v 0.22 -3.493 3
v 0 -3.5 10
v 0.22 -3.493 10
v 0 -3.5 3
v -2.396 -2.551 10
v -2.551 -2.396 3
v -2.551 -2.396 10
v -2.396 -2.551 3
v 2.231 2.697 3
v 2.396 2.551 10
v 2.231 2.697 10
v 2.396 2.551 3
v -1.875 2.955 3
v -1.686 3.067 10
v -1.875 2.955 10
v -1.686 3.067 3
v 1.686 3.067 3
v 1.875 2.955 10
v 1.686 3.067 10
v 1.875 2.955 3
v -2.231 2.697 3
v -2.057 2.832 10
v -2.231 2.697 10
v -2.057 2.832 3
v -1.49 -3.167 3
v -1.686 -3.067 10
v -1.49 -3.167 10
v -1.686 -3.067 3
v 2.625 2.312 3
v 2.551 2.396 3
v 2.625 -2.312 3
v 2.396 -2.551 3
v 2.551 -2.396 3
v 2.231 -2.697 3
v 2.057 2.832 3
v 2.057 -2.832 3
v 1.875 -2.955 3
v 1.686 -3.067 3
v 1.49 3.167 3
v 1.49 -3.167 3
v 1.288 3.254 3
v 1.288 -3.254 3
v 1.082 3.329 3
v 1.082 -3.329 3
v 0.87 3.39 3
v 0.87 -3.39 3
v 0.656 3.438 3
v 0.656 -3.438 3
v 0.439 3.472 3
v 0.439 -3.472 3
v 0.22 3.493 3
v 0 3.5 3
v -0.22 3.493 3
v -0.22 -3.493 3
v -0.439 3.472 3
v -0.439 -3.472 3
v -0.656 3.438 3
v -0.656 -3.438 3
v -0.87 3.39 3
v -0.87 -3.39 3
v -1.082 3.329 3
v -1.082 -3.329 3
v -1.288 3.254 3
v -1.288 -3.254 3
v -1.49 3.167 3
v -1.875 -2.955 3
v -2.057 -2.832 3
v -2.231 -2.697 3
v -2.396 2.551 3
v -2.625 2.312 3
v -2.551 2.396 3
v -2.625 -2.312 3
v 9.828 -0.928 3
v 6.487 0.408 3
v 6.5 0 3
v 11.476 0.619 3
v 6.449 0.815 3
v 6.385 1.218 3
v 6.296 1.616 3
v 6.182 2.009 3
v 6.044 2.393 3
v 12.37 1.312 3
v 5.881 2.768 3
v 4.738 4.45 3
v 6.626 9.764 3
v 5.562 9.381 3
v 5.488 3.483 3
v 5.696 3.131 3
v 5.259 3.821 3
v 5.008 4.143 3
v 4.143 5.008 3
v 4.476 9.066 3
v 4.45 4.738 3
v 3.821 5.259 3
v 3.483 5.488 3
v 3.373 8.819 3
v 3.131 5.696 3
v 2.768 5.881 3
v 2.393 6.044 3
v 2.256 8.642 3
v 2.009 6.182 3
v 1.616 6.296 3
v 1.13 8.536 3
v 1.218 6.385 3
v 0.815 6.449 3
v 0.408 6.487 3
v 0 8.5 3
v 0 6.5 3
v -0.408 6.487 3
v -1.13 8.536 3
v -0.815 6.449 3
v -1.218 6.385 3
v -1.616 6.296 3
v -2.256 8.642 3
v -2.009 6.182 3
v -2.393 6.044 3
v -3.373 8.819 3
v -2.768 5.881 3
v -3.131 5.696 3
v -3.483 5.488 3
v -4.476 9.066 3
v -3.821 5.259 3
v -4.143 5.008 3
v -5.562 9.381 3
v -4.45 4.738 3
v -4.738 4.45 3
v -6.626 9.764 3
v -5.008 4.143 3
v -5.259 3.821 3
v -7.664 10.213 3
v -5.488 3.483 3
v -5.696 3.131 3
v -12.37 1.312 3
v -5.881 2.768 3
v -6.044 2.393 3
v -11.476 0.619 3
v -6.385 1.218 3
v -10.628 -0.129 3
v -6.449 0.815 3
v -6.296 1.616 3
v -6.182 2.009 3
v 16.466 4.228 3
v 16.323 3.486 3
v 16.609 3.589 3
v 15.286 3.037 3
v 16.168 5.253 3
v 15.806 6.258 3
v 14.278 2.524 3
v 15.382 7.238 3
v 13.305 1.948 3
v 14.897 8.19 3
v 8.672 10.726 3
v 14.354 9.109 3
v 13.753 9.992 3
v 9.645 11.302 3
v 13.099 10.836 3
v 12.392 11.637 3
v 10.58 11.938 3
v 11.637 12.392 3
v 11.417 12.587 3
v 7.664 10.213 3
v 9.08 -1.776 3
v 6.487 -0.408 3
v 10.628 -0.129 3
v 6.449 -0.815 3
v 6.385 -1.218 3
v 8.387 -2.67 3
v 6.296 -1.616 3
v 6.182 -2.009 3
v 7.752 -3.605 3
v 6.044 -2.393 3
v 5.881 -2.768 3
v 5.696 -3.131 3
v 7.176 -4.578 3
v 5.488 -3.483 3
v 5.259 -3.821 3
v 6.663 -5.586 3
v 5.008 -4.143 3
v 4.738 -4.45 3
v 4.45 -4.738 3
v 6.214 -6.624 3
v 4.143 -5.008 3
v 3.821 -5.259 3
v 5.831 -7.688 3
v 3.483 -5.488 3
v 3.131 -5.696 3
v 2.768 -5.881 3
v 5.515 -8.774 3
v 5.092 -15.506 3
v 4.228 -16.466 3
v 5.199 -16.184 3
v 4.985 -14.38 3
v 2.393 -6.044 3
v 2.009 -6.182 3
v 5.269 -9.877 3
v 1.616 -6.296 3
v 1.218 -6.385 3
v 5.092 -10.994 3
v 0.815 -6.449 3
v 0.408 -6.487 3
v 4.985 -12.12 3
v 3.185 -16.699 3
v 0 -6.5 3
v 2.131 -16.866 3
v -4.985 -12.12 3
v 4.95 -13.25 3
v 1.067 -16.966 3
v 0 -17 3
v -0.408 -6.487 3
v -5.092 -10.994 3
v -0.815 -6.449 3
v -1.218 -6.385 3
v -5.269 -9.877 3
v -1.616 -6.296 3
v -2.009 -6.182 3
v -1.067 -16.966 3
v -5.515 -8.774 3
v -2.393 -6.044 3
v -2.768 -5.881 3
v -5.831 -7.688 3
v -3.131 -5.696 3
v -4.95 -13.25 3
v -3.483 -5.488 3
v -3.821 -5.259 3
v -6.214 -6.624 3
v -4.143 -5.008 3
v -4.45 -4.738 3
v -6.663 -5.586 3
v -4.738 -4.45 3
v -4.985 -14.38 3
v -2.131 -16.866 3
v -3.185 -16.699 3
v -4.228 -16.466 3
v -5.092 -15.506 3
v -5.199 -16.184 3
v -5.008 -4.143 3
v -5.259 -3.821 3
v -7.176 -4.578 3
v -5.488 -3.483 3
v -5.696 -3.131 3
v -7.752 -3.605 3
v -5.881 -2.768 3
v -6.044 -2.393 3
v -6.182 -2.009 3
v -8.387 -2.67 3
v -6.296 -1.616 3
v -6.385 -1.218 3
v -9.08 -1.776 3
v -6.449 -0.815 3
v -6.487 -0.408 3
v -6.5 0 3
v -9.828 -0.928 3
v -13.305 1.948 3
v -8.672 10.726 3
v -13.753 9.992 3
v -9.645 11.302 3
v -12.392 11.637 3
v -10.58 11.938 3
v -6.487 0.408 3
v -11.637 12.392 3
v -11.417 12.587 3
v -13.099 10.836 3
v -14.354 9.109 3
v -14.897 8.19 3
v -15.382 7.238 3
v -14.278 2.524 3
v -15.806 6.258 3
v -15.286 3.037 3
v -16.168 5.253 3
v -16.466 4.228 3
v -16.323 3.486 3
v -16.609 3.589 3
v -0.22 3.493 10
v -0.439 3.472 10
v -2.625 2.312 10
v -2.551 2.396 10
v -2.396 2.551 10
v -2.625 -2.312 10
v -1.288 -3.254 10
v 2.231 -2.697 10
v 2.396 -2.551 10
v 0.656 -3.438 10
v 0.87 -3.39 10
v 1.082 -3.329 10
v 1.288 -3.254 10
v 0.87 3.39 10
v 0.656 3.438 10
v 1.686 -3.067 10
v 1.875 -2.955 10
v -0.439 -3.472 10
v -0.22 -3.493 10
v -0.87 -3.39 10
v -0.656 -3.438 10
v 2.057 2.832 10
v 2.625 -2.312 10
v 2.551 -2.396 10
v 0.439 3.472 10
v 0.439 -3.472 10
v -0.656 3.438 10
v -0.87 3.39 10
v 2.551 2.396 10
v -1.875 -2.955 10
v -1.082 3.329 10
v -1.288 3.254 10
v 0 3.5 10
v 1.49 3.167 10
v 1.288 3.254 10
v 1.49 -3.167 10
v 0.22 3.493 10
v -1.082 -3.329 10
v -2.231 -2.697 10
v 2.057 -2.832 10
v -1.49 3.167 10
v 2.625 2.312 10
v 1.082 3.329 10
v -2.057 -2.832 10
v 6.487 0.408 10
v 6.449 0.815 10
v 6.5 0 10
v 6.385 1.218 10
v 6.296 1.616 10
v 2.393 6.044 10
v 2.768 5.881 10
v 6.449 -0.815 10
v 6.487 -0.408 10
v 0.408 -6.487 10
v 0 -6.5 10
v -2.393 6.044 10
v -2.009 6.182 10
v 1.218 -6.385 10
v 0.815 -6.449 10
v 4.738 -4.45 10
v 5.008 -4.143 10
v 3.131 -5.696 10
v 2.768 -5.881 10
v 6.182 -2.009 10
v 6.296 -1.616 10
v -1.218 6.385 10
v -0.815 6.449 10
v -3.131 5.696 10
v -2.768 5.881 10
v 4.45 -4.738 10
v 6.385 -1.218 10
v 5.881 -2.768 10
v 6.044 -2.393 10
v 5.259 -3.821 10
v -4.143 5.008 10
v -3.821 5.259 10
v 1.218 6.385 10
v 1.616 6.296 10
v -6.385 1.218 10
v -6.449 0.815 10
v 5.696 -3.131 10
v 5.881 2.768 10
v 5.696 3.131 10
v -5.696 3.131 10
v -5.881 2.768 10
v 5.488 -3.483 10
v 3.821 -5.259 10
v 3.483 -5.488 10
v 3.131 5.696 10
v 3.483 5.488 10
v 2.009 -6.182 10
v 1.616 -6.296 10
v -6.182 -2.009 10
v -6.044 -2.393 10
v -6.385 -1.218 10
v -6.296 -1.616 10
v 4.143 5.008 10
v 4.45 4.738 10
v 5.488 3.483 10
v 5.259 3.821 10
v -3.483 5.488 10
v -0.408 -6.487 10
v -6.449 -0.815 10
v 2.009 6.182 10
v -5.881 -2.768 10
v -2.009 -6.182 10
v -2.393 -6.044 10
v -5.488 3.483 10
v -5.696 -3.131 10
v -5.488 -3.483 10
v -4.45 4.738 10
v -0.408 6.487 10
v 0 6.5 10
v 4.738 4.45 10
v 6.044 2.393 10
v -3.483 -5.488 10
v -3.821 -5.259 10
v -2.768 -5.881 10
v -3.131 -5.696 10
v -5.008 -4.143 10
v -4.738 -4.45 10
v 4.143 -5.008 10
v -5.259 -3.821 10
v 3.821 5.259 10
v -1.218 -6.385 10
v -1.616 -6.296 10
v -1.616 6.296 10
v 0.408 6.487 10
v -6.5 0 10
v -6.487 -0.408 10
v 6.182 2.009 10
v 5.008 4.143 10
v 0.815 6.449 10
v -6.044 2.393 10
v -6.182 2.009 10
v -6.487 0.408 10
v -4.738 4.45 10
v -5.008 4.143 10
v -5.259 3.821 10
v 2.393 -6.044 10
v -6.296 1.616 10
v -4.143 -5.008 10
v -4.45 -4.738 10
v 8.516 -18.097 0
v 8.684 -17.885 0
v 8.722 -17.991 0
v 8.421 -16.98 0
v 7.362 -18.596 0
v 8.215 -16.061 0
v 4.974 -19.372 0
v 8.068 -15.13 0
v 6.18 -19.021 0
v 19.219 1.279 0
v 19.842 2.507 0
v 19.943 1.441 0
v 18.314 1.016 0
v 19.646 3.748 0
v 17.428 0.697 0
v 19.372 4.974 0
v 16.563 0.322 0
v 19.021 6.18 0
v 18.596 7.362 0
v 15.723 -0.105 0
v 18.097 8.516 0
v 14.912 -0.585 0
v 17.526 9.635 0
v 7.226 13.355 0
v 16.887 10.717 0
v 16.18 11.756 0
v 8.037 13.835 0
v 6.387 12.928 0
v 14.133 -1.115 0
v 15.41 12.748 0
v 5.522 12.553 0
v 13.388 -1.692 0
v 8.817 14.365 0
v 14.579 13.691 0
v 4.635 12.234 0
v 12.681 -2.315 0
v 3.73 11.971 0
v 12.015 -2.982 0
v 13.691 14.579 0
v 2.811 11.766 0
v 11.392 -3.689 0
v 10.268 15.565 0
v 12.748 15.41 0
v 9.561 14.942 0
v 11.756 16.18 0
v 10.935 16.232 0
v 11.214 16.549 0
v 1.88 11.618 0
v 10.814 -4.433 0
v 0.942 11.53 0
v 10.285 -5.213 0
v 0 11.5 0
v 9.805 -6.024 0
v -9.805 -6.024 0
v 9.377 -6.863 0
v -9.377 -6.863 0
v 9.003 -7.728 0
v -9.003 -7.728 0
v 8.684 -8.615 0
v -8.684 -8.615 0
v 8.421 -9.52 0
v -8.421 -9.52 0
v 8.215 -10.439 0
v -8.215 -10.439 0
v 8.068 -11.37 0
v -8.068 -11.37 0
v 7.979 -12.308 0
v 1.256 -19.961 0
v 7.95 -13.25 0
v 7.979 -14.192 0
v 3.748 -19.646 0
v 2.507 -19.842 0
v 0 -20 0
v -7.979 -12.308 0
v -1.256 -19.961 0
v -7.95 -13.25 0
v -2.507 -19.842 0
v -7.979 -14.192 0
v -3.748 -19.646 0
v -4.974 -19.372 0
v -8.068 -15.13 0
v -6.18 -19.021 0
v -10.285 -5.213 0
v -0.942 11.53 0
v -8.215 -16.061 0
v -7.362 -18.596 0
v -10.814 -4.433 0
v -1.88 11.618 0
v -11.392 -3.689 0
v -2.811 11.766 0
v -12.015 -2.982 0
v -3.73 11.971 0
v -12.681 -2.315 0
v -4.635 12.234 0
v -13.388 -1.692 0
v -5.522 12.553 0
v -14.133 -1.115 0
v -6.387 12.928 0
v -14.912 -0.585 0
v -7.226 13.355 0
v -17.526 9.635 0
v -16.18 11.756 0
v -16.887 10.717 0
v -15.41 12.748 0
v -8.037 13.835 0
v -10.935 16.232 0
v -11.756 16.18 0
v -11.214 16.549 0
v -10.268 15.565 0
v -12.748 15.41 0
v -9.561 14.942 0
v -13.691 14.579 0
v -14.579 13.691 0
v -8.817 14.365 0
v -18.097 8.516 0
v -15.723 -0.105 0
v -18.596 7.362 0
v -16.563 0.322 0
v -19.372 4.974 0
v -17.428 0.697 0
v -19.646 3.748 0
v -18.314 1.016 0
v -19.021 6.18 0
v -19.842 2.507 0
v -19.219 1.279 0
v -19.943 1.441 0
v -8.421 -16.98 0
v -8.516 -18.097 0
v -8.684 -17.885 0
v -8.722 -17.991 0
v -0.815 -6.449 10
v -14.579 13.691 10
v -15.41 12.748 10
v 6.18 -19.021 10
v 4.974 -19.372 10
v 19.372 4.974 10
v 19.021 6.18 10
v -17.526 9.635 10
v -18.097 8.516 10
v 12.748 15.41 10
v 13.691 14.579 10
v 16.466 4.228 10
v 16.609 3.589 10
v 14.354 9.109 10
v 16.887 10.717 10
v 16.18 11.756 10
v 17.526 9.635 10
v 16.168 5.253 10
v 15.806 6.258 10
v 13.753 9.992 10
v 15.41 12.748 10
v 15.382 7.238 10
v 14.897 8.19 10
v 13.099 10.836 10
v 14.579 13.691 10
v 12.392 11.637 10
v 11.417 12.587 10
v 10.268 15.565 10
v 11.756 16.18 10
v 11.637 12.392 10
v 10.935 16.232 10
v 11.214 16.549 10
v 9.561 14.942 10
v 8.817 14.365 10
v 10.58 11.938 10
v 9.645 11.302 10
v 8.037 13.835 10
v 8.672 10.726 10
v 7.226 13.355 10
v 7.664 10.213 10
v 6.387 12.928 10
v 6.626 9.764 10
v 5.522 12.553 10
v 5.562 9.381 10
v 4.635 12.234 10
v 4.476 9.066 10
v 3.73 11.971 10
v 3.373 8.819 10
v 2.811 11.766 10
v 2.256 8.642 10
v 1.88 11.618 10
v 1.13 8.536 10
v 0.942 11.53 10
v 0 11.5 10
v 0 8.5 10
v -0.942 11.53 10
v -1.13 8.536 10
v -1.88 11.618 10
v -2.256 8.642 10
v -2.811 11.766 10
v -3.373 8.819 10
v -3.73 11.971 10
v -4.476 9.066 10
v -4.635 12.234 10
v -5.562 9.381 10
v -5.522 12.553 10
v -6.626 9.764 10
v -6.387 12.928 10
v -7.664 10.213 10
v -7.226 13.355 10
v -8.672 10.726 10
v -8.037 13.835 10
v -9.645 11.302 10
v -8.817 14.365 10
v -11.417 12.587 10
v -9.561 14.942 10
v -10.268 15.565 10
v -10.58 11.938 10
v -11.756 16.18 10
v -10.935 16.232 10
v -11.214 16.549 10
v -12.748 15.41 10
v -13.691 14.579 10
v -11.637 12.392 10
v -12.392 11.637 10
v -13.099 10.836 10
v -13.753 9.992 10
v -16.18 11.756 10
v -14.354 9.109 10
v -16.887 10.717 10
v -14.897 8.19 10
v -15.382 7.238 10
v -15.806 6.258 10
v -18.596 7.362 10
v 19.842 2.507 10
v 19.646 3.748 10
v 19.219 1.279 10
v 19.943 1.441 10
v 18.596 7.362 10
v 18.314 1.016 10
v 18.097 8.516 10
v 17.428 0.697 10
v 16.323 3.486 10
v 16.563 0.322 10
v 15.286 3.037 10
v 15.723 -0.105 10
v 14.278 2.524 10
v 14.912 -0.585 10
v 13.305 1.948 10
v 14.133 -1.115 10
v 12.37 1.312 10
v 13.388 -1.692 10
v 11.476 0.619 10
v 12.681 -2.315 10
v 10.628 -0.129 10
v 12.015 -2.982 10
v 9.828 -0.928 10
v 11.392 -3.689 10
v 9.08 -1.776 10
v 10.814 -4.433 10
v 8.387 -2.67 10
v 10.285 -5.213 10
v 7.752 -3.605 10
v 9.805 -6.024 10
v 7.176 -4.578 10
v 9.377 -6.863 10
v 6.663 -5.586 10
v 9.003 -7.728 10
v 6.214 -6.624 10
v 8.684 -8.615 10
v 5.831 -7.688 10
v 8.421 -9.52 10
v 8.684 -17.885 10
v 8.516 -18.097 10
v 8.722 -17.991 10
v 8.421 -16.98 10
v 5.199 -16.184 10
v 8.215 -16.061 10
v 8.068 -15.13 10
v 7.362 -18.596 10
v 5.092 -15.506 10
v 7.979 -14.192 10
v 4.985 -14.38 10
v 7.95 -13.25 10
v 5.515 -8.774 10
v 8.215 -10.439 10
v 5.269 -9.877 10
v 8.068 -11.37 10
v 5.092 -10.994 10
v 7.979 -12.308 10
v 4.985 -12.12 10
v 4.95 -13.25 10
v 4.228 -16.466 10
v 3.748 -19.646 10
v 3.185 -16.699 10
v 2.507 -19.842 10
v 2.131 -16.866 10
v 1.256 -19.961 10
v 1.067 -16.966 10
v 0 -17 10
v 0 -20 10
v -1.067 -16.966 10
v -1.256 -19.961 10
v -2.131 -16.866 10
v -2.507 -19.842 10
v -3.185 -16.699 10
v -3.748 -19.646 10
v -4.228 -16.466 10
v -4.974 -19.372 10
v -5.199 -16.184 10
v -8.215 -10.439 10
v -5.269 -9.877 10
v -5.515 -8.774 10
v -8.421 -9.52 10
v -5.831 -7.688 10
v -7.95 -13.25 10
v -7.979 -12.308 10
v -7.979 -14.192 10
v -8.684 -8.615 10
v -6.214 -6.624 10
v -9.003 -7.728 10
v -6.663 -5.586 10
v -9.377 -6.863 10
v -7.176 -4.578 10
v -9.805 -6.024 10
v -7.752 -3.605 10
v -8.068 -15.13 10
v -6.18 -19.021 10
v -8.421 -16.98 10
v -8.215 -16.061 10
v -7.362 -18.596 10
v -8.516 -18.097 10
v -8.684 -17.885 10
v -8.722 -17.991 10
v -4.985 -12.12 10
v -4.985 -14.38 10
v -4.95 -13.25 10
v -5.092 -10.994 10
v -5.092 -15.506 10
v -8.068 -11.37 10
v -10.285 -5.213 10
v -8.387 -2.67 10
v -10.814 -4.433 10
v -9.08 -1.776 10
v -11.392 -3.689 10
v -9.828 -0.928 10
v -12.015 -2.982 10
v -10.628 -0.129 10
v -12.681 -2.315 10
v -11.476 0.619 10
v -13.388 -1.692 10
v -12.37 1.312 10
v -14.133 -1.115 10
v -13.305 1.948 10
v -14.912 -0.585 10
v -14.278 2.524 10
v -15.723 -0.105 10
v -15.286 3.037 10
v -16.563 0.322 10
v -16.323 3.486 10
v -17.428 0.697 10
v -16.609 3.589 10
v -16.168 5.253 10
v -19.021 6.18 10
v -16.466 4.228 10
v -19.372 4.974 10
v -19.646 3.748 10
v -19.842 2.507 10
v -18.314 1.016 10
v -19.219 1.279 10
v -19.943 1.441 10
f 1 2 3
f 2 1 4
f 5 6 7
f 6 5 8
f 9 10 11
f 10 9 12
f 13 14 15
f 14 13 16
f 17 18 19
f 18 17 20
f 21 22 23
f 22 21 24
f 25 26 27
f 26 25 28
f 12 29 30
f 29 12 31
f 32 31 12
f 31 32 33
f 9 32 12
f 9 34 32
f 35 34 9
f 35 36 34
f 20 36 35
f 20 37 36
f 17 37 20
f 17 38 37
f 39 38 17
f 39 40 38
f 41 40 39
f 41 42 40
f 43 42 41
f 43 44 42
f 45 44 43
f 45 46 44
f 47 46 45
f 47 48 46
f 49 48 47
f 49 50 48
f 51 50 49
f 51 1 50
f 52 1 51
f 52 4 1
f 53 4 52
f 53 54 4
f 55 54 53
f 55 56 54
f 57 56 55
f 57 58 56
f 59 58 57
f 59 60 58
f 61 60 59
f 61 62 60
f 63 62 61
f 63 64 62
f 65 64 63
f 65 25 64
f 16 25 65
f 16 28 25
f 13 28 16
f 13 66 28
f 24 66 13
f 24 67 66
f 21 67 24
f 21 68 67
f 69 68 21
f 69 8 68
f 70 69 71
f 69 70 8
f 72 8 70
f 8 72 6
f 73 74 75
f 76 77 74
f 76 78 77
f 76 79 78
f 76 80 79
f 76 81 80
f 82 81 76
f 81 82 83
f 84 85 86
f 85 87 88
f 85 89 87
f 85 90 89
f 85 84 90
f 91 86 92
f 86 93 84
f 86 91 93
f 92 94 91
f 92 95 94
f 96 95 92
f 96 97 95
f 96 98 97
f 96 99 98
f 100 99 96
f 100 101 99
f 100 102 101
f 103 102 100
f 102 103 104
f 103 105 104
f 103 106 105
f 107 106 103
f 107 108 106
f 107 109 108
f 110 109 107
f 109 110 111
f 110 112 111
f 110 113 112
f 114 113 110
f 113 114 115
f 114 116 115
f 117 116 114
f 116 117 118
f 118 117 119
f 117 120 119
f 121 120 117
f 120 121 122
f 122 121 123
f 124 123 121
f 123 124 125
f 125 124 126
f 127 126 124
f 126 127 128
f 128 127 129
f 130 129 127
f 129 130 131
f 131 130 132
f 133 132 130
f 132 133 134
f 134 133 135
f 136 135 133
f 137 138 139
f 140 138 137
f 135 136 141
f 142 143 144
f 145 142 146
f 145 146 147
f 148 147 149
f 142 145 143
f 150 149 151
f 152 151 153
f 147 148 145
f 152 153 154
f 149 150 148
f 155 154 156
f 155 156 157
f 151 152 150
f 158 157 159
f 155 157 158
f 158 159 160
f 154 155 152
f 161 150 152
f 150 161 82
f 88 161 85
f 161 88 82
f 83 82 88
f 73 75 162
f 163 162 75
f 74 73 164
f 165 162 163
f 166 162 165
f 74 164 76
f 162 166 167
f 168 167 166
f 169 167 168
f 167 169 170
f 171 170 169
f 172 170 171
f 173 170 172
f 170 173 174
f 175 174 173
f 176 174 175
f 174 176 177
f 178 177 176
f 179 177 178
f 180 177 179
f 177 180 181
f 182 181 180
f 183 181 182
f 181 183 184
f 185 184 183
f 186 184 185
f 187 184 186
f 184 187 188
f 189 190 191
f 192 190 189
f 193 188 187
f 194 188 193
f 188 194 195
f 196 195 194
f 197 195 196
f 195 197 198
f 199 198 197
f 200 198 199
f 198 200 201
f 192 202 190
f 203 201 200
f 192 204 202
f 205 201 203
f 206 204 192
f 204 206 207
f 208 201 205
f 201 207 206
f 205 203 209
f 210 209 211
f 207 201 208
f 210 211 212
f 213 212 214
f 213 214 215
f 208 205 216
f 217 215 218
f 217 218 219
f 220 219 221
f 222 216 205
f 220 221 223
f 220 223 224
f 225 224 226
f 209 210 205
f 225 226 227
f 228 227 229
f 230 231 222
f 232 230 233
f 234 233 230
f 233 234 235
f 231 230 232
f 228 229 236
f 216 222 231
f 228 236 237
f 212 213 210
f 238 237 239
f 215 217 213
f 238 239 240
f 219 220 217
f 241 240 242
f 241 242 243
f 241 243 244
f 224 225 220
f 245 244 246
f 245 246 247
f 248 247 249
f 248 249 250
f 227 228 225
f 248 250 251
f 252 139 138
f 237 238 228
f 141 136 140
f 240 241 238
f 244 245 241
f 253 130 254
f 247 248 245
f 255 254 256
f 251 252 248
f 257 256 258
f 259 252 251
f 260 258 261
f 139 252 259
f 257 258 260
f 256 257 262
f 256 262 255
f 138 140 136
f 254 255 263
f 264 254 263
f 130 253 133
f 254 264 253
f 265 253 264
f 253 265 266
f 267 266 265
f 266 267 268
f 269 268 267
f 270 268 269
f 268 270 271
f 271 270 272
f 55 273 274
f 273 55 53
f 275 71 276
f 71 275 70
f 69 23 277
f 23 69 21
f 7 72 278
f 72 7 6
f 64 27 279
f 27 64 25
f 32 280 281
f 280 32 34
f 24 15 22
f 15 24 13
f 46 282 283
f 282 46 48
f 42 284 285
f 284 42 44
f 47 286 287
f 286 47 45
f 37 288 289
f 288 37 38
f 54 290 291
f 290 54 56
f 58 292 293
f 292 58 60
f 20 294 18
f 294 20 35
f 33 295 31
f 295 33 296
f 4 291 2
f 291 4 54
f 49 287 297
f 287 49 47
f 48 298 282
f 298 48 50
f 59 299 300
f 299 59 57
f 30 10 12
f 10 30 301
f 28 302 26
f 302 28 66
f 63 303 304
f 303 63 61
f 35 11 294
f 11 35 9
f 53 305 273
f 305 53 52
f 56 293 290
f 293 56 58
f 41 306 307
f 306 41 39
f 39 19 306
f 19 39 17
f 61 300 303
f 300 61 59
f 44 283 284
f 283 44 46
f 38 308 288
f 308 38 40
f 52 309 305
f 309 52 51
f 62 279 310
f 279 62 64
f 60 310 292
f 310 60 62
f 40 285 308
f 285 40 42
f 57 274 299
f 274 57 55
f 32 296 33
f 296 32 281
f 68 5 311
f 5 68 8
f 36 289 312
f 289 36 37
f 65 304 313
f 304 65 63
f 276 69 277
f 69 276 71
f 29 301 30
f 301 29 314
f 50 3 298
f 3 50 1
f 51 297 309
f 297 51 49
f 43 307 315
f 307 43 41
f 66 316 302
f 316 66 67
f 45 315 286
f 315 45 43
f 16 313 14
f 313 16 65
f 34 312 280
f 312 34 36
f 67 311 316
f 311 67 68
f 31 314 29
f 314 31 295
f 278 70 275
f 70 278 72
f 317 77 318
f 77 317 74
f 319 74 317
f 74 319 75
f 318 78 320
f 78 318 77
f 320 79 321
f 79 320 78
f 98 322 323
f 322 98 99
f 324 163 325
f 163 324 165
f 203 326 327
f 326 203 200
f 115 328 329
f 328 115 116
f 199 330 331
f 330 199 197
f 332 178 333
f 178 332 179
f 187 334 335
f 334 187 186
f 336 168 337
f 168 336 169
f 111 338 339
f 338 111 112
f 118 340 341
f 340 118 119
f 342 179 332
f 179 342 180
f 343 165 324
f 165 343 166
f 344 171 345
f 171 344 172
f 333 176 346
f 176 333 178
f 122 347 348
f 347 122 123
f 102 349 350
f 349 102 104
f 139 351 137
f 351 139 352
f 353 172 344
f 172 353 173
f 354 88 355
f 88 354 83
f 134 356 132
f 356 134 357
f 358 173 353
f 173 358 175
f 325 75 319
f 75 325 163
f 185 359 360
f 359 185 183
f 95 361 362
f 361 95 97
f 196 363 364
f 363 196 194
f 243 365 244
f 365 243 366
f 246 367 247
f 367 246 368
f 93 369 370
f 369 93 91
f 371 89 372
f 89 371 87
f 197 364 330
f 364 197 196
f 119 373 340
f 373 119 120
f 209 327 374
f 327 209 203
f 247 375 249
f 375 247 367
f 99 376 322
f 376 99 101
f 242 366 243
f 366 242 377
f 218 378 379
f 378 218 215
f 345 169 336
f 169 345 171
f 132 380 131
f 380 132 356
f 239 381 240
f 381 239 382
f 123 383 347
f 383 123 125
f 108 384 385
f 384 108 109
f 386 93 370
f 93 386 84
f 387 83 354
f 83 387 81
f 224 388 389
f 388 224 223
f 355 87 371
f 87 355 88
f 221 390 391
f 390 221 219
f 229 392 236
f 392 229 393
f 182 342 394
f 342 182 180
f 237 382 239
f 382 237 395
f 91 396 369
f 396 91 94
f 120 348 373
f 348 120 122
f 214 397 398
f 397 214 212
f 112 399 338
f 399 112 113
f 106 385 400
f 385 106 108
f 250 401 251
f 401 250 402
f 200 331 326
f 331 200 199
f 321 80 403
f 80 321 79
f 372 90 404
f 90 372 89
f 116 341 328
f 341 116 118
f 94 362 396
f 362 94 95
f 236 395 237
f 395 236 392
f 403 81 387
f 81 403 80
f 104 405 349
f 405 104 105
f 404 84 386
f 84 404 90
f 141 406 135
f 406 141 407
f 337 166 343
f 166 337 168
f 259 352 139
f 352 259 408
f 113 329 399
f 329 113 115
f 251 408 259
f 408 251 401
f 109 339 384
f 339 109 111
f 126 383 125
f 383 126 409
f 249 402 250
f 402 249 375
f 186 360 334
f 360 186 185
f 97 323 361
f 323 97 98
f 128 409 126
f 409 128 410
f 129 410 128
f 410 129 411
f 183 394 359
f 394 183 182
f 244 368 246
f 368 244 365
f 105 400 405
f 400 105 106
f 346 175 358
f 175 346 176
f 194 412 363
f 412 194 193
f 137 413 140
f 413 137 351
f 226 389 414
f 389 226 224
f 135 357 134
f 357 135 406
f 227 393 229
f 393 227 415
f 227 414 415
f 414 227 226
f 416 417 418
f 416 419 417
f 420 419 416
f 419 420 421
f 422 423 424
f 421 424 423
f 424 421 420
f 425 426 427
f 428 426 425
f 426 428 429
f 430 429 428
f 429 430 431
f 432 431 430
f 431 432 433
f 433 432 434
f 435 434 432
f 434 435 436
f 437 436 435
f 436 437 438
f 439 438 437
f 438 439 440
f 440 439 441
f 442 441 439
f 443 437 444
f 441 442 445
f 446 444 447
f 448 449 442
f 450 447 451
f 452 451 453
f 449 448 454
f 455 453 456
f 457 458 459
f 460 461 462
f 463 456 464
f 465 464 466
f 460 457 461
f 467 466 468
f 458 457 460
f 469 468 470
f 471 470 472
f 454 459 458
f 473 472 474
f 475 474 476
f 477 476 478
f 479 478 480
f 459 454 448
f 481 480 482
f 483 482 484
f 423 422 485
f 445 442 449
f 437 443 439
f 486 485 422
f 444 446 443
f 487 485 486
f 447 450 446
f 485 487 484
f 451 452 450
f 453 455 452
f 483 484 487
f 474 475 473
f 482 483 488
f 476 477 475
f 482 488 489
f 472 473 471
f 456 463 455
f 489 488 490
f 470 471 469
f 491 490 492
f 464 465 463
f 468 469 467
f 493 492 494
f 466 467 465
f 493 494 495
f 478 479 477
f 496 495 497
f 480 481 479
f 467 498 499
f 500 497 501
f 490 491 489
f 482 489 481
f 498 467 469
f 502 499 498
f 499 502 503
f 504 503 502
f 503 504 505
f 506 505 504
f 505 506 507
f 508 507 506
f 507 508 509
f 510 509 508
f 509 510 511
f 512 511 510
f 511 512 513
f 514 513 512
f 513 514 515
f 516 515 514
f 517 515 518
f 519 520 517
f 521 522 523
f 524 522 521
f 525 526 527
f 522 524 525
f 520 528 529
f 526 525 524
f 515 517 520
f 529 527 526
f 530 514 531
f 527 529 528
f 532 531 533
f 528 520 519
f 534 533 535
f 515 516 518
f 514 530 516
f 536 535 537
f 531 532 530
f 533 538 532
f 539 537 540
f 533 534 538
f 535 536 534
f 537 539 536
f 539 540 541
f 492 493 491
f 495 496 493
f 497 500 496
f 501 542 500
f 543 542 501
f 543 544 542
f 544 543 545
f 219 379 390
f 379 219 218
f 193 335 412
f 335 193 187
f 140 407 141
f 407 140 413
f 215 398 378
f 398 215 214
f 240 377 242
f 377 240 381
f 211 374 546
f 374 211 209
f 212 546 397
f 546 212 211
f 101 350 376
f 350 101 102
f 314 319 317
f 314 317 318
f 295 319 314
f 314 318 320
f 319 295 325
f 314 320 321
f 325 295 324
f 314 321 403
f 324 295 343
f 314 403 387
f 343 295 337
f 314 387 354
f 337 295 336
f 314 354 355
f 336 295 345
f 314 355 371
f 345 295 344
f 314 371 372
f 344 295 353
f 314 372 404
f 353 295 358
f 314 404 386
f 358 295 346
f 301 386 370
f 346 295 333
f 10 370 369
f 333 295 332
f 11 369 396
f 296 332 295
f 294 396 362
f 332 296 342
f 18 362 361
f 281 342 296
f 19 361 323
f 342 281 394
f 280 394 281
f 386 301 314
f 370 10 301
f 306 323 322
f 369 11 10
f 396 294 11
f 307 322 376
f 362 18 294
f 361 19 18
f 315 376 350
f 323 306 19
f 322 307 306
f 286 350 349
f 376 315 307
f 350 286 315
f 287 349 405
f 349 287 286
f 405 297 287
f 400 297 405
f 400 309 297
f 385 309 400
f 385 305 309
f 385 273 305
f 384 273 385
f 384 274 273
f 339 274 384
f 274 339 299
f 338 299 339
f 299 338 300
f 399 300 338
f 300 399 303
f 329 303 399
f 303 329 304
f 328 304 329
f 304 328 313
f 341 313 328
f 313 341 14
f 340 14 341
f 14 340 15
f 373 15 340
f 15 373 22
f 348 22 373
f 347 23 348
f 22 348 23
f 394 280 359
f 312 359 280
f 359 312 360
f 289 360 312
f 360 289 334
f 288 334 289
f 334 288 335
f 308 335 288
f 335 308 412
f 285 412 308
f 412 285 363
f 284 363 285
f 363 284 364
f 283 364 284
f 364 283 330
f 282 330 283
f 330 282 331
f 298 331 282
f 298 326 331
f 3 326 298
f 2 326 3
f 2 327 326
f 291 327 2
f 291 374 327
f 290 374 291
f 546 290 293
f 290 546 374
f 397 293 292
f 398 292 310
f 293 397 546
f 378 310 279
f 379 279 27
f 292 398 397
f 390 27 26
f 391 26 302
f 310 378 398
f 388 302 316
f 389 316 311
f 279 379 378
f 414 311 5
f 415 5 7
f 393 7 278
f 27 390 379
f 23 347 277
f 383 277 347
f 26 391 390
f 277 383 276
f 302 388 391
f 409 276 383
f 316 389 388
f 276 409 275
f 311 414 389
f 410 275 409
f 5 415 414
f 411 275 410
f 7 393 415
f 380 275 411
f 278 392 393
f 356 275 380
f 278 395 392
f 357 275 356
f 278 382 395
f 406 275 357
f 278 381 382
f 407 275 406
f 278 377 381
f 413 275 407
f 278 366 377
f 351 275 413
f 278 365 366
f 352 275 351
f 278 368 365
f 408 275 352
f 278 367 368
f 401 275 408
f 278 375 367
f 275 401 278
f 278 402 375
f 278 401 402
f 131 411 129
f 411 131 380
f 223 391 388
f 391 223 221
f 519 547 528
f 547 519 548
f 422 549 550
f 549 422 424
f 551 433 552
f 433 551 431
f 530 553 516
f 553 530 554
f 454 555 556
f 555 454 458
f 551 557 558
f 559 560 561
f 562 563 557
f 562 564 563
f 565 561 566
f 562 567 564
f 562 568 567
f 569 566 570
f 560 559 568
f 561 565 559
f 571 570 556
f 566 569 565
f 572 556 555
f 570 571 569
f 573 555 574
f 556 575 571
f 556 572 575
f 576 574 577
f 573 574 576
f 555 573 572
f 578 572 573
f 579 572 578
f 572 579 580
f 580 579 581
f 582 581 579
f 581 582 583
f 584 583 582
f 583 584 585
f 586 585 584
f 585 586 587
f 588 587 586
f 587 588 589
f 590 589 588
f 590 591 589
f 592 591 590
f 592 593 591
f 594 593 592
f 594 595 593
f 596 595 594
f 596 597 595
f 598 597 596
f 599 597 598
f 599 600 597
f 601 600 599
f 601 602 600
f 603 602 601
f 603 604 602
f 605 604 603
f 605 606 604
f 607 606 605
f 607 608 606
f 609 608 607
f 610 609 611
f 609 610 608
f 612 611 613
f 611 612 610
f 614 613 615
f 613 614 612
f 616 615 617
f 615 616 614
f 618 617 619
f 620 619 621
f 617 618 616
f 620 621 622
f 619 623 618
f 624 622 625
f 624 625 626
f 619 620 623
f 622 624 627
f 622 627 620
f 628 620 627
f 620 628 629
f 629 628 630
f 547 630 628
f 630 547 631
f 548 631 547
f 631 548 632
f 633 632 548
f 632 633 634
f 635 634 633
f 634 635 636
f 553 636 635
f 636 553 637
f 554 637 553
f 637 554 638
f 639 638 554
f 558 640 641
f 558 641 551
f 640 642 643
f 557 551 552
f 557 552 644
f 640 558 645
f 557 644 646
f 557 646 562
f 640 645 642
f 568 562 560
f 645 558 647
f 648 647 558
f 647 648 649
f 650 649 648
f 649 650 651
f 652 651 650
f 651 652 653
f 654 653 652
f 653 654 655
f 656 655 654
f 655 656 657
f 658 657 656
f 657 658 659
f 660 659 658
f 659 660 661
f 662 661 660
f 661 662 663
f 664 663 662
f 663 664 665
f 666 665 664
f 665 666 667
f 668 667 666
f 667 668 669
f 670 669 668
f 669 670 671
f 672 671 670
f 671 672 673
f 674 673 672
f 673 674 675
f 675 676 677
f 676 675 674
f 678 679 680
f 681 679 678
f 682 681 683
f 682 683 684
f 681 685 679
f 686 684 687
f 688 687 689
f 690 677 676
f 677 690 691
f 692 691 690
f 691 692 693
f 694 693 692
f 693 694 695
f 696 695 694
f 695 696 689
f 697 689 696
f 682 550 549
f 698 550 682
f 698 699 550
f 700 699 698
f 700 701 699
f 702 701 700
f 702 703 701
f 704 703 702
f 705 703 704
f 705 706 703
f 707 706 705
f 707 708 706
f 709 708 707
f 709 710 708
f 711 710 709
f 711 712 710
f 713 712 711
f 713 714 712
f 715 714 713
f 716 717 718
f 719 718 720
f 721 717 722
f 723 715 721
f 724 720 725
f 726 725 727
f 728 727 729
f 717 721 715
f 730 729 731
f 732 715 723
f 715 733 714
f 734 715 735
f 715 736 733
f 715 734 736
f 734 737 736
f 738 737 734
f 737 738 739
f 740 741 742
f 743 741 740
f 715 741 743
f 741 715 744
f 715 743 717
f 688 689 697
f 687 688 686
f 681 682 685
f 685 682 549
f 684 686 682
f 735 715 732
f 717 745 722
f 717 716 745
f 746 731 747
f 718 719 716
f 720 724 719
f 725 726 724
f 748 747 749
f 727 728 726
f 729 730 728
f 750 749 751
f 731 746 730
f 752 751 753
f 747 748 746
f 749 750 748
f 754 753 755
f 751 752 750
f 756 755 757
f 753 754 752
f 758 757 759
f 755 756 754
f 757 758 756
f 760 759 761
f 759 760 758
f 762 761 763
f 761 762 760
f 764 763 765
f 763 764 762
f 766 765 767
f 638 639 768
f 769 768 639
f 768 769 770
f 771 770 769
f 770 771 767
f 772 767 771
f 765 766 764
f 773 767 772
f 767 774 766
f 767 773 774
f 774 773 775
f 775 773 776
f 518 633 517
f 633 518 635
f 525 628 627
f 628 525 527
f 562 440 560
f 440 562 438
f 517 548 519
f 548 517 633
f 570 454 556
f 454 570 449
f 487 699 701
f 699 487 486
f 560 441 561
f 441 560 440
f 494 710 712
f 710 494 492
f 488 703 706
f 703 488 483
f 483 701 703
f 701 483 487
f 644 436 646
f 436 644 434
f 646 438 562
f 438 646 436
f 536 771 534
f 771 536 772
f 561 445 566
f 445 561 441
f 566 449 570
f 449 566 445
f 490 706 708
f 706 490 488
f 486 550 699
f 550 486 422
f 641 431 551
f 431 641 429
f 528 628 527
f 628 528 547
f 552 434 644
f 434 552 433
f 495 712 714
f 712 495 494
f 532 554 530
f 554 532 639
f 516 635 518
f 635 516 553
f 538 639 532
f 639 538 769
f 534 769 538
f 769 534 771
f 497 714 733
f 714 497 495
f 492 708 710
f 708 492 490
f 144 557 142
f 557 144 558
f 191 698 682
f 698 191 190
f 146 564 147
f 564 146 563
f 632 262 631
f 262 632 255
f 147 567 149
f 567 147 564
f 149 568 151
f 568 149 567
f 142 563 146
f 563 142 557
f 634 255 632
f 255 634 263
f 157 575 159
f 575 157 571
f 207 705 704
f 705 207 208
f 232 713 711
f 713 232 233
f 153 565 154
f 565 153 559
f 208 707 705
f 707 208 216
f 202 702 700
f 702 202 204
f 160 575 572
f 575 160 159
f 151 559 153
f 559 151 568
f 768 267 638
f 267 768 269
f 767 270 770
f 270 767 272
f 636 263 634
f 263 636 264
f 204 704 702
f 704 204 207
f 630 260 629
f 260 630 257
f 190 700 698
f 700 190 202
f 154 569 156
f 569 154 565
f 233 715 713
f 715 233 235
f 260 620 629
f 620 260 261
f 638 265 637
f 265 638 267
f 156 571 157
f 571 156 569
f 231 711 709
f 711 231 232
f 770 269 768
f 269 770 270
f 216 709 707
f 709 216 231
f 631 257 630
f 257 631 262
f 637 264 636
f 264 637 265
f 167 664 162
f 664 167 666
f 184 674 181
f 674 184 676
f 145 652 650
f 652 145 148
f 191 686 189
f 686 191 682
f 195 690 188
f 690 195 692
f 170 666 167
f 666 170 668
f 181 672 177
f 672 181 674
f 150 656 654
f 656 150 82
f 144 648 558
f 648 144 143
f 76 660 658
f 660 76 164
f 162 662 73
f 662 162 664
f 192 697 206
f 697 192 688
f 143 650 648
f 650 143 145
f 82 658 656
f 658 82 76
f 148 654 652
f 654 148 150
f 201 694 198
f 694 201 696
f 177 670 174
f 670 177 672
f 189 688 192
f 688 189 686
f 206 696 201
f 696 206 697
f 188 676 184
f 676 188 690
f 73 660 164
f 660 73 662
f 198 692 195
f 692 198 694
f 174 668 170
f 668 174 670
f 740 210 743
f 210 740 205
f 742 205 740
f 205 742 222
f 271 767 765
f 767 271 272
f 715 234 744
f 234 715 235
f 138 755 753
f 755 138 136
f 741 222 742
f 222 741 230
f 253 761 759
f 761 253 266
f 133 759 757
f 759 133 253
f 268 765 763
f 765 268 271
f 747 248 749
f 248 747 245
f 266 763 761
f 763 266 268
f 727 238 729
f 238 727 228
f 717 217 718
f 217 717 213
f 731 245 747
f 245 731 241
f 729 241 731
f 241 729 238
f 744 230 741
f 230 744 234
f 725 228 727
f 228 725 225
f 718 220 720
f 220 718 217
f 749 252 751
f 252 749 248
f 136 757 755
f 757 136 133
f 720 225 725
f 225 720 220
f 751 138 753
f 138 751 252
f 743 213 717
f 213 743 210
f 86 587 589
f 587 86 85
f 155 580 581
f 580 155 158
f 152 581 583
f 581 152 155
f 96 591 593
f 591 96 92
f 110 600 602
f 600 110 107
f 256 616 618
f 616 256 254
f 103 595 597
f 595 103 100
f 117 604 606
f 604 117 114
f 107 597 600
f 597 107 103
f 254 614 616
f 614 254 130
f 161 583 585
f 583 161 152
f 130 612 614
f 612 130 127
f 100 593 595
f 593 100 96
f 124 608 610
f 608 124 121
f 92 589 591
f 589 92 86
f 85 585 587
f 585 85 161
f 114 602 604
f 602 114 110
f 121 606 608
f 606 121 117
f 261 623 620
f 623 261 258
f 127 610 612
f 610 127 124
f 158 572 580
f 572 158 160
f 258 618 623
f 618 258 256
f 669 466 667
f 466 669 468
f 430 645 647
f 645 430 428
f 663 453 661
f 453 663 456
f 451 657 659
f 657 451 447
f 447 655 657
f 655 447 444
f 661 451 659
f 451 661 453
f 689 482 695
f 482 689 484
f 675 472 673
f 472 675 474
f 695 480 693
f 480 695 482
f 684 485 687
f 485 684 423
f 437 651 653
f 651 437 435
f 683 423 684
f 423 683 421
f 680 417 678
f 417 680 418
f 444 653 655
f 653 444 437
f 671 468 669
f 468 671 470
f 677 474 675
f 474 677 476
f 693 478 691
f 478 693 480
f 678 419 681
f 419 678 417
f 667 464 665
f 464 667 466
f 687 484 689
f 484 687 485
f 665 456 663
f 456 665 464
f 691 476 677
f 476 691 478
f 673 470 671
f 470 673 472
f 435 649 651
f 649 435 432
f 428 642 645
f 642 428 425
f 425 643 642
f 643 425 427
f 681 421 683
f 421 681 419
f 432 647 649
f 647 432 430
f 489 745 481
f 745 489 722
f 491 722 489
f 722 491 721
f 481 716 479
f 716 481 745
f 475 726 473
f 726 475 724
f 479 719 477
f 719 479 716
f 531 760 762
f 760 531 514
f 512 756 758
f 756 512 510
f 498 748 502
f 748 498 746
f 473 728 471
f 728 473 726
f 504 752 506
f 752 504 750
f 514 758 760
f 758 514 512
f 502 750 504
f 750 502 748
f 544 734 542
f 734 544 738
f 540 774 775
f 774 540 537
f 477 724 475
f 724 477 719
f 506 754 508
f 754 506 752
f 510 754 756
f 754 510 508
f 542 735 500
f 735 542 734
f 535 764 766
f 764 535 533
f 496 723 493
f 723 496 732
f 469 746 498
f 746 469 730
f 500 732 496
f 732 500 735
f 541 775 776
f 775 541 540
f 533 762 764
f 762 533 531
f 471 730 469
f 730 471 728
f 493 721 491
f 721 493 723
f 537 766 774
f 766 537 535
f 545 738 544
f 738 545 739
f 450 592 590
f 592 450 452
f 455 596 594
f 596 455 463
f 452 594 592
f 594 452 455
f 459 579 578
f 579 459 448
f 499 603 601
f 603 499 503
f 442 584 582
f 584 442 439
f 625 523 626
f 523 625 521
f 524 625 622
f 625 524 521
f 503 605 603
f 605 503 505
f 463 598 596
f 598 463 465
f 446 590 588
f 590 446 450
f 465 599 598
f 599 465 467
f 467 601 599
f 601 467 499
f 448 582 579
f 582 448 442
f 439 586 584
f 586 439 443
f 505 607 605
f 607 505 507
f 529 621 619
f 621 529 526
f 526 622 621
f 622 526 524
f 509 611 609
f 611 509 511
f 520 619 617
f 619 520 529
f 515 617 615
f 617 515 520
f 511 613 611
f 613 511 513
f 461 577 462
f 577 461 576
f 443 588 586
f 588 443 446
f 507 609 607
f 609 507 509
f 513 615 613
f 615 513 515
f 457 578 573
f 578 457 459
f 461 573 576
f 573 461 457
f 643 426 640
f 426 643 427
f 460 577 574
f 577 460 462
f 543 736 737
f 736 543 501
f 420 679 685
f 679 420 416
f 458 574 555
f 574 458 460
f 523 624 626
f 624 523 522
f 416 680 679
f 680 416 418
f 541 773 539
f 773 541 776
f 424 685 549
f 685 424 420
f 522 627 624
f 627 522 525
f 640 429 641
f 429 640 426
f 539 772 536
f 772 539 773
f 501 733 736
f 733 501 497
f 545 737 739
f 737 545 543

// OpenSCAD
$fn=100;

thickness=10;
outer_r=20;
knob_r=15;
bolt_r=3.5;
wall_thickness=3;
square_ratio=1.5;



difference(){
    cylinder(r=bolt_r+wall_thickness,h=thickness);
    intersection(){
        translate([0,0,wall_thickness])cylinder(r=bolt_r,h=thickness);
        translate([-square_ratio*.5*bolt_r,-bolt_r*2,wall_thickness])cube([square_ratio*bolt_r,bolt_r*4,thickness]);
    }
}

intersection(){
    difference(){
        union(){
            difference(){
                cylinder(r=outer_r,h=thickness);
                translate([0,0,wall_thickness])cylinder(r=outer_r-wall_thickness,h=thickness);
                }
            translate([(outer_r+bolt_r+wall_thickness)*sin(120),(outer_r+bolt_r+wall_thickness)*cos(120),0])cylinder(r=knob_r+wall_thickness,h=thickness);
            translate([(outer_r+bolt_r+wall_thickness)*sin(240),(outer_r+bolt_r+wall_thickness)*cos(240),0])cylinder(r=knob_r+wall_thickness,h=thickness);
            translate([(outer_r+bolt_r+wall_thickness)*sin(360),(outer_r+bolt_r+wall_thickness)*cos(360),0])cylinder(r=knob_r+wall_thickness,h=thickness);
        }

        translate([(outer_r+bolt_r+wall_thickness)*sin(120),(outer_r+bolt_r+wall_thickness)*cos(120),-wall_thickness])cylinder(r=knob_r,h=thickness+wall_thickness*2);
        translate([(outer_r+bolt_r+wall_thickness)*sin(240),(outer_r+bolt_r+wall_thickness)*cos(240),-wall_thickness])cylinder(r=knob_r,h=thickness+wall_thickness*2);
        translate([(outer_r+bolt_r+wall_thickness)*sin(360),(outer_r+bolt_r+wall_thickness)*cos(360),-wall_thickness])cylinder(r=knob_r,h=thickness+wall_thickness*2);
    }
    
    cylinder(r=outer_r,h=thickness);
}
